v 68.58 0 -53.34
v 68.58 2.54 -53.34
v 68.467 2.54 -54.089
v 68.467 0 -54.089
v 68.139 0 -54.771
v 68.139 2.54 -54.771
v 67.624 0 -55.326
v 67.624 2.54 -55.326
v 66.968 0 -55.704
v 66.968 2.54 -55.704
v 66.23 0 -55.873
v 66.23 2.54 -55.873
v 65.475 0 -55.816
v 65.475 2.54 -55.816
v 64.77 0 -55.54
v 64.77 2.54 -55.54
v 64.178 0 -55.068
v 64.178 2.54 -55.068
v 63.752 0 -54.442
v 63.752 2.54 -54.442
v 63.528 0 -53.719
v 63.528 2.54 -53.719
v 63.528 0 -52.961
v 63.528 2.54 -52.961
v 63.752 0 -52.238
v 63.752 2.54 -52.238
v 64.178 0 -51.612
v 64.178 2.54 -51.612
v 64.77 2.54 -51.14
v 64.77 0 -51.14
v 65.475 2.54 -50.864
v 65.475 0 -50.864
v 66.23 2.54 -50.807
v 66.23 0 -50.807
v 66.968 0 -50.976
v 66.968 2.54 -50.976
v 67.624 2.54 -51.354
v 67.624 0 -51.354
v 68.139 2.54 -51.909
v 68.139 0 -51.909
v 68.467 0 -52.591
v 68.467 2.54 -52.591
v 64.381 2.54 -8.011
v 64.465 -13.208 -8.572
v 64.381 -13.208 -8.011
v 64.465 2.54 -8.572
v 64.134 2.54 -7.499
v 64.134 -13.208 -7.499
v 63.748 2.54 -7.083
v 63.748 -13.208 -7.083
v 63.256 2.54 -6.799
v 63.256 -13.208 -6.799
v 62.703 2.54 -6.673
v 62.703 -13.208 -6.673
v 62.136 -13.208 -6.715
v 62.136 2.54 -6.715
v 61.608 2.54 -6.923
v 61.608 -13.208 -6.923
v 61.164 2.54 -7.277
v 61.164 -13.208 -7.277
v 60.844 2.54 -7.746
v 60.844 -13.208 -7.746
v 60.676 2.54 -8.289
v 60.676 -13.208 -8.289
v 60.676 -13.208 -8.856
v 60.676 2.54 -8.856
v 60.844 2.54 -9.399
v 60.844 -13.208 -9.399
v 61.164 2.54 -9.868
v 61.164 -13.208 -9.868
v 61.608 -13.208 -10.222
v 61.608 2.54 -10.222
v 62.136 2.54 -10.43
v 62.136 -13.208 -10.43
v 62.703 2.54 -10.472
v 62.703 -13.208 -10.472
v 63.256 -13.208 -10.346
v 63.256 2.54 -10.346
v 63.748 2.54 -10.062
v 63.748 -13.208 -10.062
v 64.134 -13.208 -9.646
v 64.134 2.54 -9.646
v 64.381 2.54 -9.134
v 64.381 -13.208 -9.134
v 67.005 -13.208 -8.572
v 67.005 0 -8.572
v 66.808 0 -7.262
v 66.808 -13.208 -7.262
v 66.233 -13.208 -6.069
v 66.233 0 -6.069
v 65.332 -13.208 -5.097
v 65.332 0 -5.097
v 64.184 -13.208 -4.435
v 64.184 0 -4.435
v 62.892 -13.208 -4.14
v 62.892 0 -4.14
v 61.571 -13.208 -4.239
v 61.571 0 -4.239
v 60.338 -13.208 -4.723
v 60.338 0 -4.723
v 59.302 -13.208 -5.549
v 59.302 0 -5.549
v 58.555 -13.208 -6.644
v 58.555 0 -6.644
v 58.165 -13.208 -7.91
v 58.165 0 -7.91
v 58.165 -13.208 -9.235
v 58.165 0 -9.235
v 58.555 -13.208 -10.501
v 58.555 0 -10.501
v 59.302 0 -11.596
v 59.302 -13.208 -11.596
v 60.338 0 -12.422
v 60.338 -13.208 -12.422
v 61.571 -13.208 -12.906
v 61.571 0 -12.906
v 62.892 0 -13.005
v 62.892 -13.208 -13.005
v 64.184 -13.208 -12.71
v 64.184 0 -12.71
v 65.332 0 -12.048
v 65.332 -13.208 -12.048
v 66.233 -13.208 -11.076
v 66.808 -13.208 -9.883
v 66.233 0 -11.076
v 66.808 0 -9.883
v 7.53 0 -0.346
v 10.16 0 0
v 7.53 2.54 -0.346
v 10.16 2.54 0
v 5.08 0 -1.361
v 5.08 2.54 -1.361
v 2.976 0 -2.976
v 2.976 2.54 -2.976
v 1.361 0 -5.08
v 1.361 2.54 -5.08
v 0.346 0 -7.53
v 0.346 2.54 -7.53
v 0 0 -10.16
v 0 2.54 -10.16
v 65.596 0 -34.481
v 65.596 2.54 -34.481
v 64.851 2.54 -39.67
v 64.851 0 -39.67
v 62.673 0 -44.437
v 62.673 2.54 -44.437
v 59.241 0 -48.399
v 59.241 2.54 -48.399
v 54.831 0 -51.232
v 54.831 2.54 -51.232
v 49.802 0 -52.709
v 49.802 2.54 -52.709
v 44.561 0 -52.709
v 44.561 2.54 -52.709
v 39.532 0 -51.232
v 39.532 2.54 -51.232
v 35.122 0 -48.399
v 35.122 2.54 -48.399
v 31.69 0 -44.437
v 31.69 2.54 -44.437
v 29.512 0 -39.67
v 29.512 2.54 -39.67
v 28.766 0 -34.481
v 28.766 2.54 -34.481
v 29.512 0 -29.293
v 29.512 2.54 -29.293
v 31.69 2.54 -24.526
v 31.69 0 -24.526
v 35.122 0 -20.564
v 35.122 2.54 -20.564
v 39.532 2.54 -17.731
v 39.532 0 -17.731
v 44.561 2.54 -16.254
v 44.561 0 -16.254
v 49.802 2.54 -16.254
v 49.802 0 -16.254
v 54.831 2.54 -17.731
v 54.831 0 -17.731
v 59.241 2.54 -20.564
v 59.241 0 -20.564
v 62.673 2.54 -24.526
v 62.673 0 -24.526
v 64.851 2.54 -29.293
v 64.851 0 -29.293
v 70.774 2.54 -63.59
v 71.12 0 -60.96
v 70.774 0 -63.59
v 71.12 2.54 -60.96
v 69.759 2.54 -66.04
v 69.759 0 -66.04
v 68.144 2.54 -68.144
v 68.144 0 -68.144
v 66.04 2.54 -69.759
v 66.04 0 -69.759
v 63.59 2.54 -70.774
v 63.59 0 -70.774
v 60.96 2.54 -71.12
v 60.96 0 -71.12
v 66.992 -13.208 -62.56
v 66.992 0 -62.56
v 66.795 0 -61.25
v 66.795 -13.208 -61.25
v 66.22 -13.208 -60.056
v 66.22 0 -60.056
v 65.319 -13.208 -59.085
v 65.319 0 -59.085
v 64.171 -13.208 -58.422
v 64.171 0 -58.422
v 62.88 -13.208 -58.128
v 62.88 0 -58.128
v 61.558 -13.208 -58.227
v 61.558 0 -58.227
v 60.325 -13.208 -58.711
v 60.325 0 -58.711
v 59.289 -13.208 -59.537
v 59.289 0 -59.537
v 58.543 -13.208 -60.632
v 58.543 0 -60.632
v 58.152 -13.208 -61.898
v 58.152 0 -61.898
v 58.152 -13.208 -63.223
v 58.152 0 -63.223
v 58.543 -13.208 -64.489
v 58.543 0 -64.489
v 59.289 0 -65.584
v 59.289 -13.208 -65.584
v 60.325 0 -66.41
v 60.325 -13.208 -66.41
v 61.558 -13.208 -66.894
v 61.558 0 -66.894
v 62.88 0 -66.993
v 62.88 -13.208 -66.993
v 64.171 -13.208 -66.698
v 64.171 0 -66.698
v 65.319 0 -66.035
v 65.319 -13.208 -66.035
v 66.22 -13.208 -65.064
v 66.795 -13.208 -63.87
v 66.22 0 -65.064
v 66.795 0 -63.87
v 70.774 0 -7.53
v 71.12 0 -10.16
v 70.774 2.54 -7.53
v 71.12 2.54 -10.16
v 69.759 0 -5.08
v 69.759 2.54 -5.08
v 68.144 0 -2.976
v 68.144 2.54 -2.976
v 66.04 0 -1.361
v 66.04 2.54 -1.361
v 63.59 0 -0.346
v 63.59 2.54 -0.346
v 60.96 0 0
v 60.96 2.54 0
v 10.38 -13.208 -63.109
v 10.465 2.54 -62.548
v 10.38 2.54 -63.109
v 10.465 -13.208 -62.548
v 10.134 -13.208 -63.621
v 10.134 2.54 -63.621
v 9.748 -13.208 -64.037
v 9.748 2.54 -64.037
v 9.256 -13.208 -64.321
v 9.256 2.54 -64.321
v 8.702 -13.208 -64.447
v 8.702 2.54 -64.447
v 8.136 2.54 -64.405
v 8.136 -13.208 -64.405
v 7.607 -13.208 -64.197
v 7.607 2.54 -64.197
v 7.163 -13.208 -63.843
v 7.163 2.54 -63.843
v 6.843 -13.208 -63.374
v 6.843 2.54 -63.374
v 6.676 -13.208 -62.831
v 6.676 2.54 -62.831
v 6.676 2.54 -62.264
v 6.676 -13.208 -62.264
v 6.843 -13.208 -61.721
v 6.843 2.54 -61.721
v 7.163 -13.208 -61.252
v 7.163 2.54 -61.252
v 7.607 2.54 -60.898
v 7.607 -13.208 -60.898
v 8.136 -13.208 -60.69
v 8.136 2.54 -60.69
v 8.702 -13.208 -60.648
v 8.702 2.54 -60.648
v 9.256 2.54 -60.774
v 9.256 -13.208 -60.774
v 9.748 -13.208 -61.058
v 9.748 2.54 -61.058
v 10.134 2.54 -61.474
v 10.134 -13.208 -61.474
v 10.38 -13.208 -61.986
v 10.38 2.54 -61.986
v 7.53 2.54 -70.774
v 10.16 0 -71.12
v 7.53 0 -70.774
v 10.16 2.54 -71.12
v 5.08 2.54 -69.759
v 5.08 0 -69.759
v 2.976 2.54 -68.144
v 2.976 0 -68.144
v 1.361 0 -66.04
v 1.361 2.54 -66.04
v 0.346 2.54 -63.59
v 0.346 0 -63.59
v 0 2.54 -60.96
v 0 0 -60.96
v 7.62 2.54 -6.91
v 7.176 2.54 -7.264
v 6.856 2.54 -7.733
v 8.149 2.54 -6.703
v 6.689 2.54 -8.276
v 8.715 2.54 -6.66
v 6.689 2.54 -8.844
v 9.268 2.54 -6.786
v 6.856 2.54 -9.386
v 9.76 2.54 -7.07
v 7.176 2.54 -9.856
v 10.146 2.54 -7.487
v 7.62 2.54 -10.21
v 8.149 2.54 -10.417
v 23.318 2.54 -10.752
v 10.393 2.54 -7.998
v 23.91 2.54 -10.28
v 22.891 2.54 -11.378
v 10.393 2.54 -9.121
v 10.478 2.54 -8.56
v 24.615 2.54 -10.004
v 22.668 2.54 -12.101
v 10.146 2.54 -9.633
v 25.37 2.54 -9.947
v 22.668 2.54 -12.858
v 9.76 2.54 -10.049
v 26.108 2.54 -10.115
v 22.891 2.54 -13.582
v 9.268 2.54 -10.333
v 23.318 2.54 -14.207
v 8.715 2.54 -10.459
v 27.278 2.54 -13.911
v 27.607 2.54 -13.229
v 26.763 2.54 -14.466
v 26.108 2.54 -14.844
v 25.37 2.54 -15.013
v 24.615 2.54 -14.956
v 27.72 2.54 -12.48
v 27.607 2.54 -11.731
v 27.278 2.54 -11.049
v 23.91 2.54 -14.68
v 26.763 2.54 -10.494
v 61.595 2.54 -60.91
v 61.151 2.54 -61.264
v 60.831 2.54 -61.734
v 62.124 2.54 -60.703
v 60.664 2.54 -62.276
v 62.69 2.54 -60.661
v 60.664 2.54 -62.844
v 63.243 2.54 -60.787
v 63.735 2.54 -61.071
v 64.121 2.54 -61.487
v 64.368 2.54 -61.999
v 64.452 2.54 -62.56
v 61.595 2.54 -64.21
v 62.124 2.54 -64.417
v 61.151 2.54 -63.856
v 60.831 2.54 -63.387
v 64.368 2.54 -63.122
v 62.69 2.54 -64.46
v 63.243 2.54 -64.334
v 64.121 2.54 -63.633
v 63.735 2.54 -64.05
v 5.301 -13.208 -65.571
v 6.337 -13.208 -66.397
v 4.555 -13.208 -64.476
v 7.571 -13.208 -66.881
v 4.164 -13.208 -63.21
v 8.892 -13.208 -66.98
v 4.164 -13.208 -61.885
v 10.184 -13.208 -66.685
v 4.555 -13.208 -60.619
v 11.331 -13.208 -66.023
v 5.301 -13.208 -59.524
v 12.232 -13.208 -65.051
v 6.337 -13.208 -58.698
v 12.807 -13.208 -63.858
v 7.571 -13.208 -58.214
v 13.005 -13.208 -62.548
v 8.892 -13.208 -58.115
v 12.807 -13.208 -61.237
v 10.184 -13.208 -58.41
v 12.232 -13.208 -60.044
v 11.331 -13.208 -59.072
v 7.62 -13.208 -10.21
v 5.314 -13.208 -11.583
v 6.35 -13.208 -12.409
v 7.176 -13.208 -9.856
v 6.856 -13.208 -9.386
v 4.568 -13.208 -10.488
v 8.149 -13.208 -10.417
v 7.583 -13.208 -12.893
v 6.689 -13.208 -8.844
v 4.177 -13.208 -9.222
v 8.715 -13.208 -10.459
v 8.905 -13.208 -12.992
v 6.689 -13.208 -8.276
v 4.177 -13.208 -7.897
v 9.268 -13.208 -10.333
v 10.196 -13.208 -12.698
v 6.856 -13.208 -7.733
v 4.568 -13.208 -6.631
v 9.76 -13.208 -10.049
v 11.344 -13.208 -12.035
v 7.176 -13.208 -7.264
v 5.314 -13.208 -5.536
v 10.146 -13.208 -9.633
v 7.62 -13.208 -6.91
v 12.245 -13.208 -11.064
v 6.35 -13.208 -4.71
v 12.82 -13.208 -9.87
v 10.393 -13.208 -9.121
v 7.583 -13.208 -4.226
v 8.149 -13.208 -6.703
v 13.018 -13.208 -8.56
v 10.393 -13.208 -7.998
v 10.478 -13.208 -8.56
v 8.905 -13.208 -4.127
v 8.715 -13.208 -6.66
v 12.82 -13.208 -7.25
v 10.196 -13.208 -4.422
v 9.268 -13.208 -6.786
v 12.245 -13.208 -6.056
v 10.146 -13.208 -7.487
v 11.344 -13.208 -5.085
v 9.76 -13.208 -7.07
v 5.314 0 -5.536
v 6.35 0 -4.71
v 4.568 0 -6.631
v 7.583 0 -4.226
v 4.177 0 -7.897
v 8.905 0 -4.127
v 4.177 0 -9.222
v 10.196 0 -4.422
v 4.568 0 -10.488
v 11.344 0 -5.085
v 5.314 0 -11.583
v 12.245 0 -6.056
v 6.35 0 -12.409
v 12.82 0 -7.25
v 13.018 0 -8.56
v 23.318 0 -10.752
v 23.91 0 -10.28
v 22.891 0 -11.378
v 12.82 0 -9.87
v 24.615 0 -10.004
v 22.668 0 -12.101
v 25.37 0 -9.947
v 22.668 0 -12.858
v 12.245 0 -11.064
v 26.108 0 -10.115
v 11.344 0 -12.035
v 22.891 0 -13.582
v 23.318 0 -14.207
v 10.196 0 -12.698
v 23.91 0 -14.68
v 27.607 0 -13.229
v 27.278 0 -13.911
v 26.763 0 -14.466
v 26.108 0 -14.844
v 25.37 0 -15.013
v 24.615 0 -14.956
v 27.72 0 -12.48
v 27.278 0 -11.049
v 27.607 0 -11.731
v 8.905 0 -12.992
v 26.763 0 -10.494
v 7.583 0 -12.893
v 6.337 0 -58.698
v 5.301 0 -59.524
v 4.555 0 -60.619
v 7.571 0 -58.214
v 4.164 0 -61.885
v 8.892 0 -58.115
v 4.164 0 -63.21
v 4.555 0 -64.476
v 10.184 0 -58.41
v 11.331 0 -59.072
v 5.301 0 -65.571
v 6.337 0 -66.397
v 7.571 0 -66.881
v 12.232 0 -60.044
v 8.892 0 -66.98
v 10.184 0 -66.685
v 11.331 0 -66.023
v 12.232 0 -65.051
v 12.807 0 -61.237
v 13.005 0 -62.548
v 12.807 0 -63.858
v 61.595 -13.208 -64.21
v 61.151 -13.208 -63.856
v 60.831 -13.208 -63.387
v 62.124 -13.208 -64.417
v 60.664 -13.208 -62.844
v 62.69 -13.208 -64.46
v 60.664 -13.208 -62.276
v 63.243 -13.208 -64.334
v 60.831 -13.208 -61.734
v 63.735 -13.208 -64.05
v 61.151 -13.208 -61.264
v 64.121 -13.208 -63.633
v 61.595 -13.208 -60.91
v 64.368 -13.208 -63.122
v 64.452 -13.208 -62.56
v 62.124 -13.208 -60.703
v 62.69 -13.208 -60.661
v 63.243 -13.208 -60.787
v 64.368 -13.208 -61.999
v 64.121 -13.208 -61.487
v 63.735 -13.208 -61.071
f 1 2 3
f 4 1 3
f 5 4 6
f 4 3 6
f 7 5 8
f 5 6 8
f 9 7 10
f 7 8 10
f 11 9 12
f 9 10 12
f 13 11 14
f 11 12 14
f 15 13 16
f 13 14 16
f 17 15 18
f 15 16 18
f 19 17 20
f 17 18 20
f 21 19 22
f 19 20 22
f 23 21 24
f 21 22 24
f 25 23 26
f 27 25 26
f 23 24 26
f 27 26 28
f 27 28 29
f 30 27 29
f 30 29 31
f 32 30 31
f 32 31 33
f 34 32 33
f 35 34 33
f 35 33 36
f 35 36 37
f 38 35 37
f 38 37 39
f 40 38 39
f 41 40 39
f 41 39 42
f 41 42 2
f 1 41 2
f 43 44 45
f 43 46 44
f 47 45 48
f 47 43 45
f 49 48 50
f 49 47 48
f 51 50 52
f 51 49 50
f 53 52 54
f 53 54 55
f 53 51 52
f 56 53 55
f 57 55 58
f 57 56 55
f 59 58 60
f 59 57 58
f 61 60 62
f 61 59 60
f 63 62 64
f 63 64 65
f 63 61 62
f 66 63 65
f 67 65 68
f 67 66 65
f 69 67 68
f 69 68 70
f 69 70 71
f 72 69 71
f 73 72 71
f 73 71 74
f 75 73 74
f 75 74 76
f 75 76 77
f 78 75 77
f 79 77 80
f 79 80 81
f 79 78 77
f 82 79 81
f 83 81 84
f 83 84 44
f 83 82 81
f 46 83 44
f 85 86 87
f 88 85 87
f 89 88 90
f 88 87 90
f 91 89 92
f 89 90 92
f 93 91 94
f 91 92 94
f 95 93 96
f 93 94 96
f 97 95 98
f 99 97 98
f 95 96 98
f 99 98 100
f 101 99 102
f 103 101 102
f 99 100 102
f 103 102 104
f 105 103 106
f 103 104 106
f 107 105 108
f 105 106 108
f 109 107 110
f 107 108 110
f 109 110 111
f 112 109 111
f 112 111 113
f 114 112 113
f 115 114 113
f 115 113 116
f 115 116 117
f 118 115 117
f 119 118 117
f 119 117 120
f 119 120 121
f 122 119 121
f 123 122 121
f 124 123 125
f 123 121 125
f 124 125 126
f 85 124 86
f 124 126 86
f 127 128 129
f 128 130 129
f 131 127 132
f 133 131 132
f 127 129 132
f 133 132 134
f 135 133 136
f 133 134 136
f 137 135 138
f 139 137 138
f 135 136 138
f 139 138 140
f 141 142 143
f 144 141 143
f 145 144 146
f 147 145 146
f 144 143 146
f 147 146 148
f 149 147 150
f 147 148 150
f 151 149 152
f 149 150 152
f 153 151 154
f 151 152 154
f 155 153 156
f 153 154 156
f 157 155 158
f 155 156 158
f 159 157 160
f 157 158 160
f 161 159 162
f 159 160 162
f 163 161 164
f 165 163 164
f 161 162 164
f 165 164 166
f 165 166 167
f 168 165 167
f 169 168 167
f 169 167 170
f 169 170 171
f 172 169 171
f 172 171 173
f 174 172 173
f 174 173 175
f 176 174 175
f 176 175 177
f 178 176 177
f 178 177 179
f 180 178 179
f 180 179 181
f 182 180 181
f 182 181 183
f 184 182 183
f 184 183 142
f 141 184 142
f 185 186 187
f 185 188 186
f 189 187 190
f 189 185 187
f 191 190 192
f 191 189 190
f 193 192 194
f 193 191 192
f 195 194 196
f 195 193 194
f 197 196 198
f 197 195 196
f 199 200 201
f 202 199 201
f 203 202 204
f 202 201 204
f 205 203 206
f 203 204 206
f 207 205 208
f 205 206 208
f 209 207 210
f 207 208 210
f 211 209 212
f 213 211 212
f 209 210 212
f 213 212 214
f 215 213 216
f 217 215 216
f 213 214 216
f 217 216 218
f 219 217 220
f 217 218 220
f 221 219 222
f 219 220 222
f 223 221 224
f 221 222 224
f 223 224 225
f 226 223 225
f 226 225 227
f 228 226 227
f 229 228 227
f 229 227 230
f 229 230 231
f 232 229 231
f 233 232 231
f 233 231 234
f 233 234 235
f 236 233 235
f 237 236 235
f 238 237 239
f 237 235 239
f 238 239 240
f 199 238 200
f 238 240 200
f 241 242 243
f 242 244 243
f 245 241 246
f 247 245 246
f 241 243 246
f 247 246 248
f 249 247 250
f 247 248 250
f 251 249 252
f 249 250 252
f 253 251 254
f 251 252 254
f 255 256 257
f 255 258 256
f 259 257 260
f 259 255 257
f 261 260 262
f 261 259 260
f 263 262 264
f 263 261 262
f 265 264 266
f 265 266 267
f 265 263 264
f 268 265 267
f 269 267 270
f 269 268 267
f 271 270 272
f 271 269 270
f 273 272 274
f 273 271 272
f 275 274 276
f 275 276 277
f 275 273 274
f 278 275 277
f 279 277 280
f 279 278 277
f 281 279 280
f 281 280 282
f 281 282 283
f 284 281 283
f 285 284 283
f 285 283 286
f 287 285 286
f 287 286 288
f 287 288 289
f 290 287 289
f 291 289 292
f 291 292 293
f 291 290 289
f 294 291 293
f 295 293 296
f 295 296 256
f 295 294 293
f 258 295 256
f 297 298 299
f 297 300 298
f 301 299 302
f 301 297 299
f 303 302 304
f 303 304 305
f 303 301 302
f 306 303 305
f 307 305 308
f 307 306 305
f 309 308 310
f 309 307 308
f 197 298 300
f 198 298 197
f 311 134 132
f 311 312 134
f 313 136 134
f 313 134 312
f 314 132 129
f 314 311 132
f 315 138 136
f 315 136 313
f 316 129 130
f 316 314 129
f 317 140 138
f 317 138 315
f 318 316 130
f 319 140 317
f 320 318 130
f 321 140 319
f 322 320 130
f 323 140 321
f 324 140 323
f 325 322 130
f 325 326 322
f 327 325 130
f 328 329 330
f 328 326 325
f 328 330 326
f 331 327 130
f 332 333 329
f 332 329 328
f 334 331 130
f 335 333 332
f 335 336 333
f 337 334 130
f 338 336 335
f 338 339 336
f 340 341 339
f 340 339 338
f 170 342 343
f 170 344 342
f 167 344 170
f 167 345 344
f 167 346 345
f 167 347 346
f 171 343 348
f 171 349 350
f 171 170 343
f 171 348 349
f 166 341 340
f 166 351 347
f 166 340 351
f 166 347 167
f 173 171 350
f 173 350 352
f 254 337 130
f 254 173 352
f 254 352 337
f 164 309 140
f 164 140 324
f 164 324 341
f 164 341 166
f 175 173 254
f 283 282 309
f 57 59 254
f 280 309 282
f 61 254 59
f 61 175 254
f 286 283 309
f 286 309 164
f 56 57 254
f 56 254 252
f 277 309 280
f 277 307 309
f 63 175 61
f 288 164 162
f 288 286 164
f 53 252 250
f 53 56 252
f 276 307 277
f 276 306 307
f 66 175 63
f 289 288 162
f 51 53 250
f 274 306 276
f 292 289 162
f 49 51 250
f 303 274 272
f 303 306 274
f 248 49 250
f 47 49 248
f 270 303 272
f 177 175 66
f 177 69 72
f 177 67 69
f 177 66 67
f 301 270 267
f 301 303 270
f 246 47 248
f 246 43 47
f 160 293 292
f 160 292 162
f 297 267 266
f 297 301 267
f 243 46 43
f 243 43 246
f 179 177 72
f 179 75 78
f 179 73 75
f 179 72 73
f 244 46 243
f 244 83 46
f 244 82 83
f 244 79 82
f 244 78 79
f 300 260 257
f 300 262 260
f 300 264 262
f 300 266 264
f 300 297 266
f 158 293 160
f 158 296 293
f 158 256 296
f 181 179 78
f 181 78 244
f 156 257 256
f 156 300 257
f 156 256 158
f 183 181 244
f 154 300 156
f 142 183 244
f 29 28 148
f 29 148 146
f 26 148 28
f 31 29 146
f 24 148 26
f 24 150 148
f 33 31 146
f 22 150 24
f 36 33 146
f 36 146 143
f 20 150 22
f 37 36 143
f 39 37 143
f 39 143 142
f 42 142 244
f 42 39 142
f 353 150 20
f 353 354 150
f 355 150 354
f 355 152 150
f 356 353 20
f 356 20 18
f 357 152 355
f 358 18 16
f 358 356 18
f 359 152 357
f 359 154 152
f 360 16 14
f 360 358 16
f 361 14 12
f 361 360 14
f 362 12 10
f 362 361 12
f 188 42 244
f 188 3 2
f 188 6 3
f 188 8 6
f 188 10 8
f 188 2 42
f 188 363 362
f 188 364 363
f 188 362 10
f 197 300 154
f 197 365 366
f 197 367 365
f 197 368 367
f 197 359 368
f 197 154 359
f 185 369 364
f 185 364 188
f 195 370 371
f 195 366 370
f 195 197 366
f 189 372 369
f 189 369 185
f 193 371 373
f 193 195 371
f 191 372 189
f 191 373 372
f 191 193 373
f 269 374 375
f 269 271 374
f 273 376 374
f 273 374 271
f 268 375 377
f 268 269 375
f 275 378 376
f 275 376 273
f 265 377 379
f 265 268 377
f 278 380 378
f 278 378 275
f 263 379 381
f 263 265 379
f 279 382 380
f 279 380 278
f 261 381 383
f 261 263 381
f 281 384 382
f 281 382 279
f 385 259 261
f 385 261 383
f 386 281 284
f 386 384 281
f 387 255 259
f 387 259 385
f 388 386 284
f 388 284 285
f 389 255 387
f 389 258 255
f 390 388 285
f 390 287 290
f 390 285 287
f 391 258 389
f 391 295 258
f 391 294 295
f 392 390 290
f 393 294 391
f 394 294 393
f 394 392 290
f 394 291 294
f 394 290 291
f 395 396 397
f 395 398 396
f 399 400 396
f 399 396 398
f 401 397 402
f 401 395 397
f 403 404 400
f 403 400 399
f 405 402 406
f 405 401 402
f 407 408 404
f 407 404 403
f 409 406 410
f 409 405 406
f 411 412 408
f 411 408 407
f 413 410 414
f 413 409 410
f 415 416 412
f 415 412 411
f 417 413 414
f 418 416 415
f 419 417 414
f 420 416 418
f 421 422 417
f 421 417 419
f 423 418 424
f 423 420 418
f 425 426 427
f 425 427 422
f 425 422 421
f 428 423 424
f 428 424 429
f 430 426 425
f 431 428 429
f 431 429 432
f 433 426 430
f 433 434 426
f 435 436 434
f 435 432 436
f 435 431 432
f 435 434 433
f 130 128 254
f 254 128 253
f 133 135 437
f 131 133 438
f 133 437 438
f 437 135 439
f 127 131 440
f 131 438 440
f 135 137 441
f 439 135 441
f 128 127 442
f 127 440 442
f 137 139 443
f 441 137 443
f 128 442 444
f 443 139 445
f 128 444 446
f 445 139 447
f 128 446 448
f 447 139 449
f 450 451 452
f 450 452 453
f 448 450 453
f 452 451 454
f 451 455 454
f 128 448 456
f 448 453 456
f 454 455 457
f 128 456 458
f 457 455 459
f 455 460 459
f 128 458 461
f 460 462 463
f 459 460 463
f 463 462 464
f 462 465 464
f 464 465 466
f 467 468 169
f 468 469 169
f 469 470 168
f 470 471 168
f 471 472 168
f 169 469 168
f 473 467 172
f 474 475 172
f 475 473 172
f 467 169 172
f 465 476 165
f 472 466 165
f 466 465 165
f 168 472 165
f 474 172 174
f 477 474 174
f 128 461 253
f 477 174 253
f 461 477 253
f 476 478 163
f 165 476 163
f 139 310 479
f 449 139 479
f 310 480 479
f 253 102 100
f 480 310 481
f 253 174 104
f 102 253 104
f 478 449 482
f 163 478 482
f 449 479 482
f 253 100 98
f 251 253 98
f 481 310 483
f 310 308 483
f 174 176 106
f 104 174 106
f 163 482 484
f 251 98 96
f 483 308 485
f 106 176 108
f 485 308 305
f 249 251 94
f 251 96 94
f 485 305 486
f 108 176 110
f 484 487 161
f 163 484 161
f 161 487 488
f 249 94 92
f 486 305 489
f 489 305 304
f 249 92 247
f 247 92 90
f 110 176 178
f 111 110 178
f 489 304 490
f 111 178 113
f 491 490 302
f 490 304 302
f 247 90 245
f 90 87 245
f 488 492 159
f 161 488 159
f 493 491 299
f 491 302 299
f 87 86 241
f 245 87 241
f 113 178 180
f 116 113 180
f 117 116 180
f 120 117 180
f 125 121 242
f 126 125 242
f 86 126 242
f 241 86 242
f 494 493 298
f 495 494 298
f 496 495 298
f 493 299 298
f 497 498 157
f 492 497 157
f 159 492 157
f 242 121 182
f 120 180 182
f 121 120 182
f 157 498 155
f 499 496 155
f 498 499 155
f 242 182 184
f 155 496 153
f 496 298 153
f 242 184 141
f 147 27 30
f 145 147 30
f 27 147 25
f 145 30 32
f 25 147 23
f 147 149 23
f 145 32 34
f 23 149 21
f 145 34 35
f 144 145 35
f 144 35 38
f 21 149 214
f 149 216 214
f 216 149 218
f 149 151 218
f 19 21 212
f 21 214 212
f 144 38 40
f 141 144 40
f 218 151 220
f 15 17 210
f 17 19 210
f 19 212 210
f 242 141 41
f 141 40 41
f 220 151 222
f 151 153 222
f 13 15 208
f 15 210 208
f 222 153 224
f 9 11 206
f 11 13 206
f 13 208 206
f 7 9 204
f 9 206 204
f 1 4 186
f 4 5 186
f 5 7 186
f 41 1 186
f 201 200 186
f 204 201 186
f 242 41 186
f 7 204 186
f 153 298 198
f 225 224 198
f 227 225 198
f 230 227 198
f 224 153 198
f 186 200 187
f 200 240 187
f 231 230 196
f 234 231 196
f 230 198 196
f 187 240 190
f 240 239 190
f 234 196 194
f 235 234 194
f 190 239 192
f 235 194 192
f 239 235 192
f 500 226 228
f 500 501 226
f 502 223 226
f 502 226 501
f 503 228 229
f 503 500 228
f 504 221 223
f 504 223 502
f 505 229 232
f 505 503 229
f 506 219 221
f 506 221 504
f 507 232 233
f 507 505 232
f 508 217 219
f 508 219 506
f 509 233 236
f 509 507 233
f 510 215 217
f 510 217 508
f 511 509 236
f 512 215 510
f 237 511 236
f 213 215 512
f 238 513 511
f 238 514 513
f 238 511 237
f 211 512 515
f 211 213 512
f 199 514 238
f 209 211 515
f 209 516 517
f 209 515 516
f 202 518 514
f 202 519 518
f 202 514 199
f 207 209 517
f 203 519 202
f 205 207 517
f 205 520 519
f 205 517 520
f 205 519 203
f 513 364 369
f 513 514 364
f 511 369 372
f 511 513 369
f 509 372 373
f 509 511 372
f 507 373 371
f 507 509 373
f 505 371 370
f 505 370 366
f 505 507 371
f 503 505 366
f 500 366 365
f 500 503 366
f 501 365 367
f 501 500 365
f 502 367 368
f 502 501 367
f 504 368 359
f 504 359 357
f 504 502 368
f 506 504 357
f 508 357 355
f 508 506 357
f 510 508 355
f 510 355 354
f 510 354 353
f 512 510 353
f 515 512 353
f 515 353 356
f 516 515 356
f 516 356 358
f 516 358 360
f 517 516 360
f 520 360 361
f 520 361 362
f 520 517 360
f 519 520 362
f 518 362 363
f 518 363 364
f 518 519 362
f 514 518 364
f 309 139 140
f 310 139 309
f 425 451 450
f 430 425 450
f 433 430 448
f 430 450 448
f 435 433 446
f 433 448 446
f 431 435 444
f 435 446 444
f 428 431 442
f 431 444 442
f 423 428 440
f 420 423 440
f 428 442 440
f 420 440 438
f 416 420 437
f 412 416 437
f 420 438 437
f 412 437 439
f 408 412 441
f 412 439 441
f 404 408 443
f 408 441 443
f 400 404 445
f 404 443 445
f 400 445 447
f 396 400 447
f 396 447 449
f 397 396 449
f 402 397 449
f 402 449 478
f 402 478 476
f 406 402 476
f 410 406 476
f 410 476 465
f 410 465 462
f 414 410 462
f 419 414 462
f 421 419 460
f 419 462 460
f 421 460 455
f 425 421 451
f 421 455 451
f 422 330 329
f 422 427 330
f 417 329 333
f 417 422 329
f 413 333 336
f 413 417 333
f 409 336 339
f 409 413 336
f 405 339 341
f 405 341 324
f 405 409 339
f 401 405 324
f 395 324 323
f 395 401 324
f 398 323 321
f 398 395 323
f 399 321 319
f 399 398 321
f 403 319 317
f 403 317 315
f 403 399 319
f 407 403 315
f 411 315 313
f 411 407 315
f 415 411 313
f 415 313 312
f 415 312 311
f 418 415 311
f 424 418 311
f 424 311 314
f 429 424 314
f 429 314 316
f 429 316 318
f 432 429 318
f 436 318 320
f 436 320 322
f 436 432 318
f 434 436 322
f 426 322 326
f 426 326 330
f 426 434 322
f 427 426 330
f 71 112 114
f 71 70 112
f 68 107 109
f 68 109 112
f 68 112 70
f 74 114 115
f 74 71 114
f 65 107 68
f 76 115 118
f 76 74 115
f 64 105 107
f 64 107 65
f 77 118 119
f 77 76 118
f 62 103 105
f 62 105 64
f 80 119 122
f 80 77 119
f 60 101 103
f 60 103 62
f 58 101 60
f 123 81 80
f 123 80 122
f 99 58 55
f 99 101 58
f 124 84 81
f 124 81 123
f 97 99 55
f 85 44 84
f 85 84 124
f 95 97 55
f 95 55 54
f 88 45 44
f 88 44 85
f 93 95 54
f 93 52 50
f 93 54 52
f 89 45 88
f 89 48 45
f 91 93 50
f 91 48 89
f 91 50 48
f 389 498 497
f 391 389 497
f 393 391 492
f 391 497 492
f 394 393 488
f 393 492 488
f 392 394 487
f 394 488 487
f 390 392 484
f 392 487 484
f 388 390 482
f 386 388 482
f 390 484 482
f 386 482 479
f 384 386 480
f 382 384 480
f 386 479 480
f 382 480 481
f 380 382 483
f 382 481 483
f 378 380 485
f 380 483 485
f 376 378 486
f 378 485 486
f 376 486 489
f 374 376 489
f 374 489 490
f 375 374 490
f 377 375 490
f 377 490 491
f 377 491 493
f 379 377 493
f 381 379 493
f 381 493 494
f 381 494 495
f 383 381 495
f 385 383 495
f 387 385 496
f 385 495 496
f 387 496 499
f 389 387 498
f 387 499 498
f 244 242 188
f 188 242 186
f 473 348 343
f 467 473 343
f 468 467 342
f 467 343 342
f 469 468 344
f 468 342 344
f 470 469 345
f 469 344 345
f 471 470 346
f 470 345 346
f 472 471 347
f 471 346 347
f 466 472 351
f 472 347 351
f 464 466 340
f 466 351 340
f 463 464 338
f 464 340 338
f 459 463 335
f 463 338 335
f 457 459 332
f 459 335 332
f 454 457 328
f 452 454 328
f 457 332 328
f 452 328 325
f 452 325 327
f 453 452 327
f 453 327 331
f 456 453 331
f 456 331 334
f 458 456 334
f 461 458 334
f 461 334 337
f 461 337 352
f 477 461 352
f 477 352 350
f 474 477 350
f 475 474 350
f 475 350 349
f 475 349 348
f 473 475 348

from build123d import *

# Parameters (mm, degrees)
SKETCH1_W           = 71.12
SKETCH1_H           = 71.12
SKETCH1_R           = 1.905
BOSS_EXTRUDE1_DEPTH = 2.54
SKETCH2_R           = 2.54
SKETCH2_R_2         = 18.415
CUT_EXTRUDE1_DEPTH  = 3.54
SKETCH3_R           = 4.445
SKETCH3_R_2         = 1.905
BOSS_EXTRUDE2_DEPTH = 13.208
FILLET1_R           = 10.16


with BuildPart() as part:
    # Sketch1 → Boss-Extrude1 (new body)
    with BuildSketch(Plane(origin=(0, 0, 0), x_dir=(1, 0, 0), z_dir=(0, 1, 0))):
        with Locations((35.56, 35.56)):
            Rectangle(SKETCH1_W, SKETCH1_H)
        with Locations((8.5598, 62.5475)):
            Circle(SKETCH1_R, mode=Mode.SUBTRACT)
        with Locations((62.5475, 62.5602)):
            Circle(SKETCH1_R, mode=Mode.SUBTRACT)
        with Locations((62.5602, 8.5725)):
            Circle(SKETCH1_R, mode=Mode.SUBTRACT)
        with Locations((8.5725, 8.5598)):
            Circle(SKETCH1_R, mode=Mode.SUBTRACT)
    extrude(amount=BOSS_EXTRUDE1_DEPTH)

    # Sketch2 → Cut-Extrude1 (cut, through all)
    with BuildSketch(Plane(origin=(0, 2.54, 0), x_dir=(1, 0, 0), z_dir=(0, 1, 0))):
        with Locations((25.179834649, 12.479834649)):
            Circle(SKETCH2_R)
        with Locations((66.04, 53.34)):
            Circle(SKETCH2_R)
        with Locations((47.181462146, 34.481462146)):
            Circle(SKETCH2_R_2)
    extrude(amount=-CUT_EXTRUDE1_DEPTH, mode=Mode.SUBTRACT)

    # Sketch3 → Boss-Extrude2 (add)
    with BuildSketch(Plane.XZ):
        with Locations((62.5602, -8.5725)):
            Circle(SKETCH3_R)
        with Locations((62.5602, -8.5725)):
            Circle(SKETCH3_R_2, mode=Mode.SUBTRACT)
        with Locations((62.5475, -62.5602)):
            Circle(SKETCH3_R)
        with Locations((62.5475, -62.5602)):
            Circle(SKETCH3_R_2, mode=Mode.SUBTRACT)
        with Locations((8.5598, -62.5475)):
            Circle(SKETCH3_R)
        with Locations((8.5598, -62.5475)):
            Circle(SKETCH3_R_2, mode=Mode.SUBTRACT)
        with Locations((8.5725, -8.5598)):
            Circle(SKETCH3_R)
        with Locations((8.5725, -8.5598)):
            Circle(SKETCH3_R_2, mode=Mode.SUBTRACT)
    extrude(amount=BOSS_EXTRUDE2_DEPTH)

    # Fillet1
    fillet1_edges = [part.edges().sort_by_distance(p)[0] for p in [
        (0, 1.27, -71.12),
        (71.12, 1.27, -71.12),
        (71.12, 1.27, 0),
        (0, 1.27, 0),
    ]]
    fillet(fillet1_edges, radius=FILLET1_R)


solid = part.part
